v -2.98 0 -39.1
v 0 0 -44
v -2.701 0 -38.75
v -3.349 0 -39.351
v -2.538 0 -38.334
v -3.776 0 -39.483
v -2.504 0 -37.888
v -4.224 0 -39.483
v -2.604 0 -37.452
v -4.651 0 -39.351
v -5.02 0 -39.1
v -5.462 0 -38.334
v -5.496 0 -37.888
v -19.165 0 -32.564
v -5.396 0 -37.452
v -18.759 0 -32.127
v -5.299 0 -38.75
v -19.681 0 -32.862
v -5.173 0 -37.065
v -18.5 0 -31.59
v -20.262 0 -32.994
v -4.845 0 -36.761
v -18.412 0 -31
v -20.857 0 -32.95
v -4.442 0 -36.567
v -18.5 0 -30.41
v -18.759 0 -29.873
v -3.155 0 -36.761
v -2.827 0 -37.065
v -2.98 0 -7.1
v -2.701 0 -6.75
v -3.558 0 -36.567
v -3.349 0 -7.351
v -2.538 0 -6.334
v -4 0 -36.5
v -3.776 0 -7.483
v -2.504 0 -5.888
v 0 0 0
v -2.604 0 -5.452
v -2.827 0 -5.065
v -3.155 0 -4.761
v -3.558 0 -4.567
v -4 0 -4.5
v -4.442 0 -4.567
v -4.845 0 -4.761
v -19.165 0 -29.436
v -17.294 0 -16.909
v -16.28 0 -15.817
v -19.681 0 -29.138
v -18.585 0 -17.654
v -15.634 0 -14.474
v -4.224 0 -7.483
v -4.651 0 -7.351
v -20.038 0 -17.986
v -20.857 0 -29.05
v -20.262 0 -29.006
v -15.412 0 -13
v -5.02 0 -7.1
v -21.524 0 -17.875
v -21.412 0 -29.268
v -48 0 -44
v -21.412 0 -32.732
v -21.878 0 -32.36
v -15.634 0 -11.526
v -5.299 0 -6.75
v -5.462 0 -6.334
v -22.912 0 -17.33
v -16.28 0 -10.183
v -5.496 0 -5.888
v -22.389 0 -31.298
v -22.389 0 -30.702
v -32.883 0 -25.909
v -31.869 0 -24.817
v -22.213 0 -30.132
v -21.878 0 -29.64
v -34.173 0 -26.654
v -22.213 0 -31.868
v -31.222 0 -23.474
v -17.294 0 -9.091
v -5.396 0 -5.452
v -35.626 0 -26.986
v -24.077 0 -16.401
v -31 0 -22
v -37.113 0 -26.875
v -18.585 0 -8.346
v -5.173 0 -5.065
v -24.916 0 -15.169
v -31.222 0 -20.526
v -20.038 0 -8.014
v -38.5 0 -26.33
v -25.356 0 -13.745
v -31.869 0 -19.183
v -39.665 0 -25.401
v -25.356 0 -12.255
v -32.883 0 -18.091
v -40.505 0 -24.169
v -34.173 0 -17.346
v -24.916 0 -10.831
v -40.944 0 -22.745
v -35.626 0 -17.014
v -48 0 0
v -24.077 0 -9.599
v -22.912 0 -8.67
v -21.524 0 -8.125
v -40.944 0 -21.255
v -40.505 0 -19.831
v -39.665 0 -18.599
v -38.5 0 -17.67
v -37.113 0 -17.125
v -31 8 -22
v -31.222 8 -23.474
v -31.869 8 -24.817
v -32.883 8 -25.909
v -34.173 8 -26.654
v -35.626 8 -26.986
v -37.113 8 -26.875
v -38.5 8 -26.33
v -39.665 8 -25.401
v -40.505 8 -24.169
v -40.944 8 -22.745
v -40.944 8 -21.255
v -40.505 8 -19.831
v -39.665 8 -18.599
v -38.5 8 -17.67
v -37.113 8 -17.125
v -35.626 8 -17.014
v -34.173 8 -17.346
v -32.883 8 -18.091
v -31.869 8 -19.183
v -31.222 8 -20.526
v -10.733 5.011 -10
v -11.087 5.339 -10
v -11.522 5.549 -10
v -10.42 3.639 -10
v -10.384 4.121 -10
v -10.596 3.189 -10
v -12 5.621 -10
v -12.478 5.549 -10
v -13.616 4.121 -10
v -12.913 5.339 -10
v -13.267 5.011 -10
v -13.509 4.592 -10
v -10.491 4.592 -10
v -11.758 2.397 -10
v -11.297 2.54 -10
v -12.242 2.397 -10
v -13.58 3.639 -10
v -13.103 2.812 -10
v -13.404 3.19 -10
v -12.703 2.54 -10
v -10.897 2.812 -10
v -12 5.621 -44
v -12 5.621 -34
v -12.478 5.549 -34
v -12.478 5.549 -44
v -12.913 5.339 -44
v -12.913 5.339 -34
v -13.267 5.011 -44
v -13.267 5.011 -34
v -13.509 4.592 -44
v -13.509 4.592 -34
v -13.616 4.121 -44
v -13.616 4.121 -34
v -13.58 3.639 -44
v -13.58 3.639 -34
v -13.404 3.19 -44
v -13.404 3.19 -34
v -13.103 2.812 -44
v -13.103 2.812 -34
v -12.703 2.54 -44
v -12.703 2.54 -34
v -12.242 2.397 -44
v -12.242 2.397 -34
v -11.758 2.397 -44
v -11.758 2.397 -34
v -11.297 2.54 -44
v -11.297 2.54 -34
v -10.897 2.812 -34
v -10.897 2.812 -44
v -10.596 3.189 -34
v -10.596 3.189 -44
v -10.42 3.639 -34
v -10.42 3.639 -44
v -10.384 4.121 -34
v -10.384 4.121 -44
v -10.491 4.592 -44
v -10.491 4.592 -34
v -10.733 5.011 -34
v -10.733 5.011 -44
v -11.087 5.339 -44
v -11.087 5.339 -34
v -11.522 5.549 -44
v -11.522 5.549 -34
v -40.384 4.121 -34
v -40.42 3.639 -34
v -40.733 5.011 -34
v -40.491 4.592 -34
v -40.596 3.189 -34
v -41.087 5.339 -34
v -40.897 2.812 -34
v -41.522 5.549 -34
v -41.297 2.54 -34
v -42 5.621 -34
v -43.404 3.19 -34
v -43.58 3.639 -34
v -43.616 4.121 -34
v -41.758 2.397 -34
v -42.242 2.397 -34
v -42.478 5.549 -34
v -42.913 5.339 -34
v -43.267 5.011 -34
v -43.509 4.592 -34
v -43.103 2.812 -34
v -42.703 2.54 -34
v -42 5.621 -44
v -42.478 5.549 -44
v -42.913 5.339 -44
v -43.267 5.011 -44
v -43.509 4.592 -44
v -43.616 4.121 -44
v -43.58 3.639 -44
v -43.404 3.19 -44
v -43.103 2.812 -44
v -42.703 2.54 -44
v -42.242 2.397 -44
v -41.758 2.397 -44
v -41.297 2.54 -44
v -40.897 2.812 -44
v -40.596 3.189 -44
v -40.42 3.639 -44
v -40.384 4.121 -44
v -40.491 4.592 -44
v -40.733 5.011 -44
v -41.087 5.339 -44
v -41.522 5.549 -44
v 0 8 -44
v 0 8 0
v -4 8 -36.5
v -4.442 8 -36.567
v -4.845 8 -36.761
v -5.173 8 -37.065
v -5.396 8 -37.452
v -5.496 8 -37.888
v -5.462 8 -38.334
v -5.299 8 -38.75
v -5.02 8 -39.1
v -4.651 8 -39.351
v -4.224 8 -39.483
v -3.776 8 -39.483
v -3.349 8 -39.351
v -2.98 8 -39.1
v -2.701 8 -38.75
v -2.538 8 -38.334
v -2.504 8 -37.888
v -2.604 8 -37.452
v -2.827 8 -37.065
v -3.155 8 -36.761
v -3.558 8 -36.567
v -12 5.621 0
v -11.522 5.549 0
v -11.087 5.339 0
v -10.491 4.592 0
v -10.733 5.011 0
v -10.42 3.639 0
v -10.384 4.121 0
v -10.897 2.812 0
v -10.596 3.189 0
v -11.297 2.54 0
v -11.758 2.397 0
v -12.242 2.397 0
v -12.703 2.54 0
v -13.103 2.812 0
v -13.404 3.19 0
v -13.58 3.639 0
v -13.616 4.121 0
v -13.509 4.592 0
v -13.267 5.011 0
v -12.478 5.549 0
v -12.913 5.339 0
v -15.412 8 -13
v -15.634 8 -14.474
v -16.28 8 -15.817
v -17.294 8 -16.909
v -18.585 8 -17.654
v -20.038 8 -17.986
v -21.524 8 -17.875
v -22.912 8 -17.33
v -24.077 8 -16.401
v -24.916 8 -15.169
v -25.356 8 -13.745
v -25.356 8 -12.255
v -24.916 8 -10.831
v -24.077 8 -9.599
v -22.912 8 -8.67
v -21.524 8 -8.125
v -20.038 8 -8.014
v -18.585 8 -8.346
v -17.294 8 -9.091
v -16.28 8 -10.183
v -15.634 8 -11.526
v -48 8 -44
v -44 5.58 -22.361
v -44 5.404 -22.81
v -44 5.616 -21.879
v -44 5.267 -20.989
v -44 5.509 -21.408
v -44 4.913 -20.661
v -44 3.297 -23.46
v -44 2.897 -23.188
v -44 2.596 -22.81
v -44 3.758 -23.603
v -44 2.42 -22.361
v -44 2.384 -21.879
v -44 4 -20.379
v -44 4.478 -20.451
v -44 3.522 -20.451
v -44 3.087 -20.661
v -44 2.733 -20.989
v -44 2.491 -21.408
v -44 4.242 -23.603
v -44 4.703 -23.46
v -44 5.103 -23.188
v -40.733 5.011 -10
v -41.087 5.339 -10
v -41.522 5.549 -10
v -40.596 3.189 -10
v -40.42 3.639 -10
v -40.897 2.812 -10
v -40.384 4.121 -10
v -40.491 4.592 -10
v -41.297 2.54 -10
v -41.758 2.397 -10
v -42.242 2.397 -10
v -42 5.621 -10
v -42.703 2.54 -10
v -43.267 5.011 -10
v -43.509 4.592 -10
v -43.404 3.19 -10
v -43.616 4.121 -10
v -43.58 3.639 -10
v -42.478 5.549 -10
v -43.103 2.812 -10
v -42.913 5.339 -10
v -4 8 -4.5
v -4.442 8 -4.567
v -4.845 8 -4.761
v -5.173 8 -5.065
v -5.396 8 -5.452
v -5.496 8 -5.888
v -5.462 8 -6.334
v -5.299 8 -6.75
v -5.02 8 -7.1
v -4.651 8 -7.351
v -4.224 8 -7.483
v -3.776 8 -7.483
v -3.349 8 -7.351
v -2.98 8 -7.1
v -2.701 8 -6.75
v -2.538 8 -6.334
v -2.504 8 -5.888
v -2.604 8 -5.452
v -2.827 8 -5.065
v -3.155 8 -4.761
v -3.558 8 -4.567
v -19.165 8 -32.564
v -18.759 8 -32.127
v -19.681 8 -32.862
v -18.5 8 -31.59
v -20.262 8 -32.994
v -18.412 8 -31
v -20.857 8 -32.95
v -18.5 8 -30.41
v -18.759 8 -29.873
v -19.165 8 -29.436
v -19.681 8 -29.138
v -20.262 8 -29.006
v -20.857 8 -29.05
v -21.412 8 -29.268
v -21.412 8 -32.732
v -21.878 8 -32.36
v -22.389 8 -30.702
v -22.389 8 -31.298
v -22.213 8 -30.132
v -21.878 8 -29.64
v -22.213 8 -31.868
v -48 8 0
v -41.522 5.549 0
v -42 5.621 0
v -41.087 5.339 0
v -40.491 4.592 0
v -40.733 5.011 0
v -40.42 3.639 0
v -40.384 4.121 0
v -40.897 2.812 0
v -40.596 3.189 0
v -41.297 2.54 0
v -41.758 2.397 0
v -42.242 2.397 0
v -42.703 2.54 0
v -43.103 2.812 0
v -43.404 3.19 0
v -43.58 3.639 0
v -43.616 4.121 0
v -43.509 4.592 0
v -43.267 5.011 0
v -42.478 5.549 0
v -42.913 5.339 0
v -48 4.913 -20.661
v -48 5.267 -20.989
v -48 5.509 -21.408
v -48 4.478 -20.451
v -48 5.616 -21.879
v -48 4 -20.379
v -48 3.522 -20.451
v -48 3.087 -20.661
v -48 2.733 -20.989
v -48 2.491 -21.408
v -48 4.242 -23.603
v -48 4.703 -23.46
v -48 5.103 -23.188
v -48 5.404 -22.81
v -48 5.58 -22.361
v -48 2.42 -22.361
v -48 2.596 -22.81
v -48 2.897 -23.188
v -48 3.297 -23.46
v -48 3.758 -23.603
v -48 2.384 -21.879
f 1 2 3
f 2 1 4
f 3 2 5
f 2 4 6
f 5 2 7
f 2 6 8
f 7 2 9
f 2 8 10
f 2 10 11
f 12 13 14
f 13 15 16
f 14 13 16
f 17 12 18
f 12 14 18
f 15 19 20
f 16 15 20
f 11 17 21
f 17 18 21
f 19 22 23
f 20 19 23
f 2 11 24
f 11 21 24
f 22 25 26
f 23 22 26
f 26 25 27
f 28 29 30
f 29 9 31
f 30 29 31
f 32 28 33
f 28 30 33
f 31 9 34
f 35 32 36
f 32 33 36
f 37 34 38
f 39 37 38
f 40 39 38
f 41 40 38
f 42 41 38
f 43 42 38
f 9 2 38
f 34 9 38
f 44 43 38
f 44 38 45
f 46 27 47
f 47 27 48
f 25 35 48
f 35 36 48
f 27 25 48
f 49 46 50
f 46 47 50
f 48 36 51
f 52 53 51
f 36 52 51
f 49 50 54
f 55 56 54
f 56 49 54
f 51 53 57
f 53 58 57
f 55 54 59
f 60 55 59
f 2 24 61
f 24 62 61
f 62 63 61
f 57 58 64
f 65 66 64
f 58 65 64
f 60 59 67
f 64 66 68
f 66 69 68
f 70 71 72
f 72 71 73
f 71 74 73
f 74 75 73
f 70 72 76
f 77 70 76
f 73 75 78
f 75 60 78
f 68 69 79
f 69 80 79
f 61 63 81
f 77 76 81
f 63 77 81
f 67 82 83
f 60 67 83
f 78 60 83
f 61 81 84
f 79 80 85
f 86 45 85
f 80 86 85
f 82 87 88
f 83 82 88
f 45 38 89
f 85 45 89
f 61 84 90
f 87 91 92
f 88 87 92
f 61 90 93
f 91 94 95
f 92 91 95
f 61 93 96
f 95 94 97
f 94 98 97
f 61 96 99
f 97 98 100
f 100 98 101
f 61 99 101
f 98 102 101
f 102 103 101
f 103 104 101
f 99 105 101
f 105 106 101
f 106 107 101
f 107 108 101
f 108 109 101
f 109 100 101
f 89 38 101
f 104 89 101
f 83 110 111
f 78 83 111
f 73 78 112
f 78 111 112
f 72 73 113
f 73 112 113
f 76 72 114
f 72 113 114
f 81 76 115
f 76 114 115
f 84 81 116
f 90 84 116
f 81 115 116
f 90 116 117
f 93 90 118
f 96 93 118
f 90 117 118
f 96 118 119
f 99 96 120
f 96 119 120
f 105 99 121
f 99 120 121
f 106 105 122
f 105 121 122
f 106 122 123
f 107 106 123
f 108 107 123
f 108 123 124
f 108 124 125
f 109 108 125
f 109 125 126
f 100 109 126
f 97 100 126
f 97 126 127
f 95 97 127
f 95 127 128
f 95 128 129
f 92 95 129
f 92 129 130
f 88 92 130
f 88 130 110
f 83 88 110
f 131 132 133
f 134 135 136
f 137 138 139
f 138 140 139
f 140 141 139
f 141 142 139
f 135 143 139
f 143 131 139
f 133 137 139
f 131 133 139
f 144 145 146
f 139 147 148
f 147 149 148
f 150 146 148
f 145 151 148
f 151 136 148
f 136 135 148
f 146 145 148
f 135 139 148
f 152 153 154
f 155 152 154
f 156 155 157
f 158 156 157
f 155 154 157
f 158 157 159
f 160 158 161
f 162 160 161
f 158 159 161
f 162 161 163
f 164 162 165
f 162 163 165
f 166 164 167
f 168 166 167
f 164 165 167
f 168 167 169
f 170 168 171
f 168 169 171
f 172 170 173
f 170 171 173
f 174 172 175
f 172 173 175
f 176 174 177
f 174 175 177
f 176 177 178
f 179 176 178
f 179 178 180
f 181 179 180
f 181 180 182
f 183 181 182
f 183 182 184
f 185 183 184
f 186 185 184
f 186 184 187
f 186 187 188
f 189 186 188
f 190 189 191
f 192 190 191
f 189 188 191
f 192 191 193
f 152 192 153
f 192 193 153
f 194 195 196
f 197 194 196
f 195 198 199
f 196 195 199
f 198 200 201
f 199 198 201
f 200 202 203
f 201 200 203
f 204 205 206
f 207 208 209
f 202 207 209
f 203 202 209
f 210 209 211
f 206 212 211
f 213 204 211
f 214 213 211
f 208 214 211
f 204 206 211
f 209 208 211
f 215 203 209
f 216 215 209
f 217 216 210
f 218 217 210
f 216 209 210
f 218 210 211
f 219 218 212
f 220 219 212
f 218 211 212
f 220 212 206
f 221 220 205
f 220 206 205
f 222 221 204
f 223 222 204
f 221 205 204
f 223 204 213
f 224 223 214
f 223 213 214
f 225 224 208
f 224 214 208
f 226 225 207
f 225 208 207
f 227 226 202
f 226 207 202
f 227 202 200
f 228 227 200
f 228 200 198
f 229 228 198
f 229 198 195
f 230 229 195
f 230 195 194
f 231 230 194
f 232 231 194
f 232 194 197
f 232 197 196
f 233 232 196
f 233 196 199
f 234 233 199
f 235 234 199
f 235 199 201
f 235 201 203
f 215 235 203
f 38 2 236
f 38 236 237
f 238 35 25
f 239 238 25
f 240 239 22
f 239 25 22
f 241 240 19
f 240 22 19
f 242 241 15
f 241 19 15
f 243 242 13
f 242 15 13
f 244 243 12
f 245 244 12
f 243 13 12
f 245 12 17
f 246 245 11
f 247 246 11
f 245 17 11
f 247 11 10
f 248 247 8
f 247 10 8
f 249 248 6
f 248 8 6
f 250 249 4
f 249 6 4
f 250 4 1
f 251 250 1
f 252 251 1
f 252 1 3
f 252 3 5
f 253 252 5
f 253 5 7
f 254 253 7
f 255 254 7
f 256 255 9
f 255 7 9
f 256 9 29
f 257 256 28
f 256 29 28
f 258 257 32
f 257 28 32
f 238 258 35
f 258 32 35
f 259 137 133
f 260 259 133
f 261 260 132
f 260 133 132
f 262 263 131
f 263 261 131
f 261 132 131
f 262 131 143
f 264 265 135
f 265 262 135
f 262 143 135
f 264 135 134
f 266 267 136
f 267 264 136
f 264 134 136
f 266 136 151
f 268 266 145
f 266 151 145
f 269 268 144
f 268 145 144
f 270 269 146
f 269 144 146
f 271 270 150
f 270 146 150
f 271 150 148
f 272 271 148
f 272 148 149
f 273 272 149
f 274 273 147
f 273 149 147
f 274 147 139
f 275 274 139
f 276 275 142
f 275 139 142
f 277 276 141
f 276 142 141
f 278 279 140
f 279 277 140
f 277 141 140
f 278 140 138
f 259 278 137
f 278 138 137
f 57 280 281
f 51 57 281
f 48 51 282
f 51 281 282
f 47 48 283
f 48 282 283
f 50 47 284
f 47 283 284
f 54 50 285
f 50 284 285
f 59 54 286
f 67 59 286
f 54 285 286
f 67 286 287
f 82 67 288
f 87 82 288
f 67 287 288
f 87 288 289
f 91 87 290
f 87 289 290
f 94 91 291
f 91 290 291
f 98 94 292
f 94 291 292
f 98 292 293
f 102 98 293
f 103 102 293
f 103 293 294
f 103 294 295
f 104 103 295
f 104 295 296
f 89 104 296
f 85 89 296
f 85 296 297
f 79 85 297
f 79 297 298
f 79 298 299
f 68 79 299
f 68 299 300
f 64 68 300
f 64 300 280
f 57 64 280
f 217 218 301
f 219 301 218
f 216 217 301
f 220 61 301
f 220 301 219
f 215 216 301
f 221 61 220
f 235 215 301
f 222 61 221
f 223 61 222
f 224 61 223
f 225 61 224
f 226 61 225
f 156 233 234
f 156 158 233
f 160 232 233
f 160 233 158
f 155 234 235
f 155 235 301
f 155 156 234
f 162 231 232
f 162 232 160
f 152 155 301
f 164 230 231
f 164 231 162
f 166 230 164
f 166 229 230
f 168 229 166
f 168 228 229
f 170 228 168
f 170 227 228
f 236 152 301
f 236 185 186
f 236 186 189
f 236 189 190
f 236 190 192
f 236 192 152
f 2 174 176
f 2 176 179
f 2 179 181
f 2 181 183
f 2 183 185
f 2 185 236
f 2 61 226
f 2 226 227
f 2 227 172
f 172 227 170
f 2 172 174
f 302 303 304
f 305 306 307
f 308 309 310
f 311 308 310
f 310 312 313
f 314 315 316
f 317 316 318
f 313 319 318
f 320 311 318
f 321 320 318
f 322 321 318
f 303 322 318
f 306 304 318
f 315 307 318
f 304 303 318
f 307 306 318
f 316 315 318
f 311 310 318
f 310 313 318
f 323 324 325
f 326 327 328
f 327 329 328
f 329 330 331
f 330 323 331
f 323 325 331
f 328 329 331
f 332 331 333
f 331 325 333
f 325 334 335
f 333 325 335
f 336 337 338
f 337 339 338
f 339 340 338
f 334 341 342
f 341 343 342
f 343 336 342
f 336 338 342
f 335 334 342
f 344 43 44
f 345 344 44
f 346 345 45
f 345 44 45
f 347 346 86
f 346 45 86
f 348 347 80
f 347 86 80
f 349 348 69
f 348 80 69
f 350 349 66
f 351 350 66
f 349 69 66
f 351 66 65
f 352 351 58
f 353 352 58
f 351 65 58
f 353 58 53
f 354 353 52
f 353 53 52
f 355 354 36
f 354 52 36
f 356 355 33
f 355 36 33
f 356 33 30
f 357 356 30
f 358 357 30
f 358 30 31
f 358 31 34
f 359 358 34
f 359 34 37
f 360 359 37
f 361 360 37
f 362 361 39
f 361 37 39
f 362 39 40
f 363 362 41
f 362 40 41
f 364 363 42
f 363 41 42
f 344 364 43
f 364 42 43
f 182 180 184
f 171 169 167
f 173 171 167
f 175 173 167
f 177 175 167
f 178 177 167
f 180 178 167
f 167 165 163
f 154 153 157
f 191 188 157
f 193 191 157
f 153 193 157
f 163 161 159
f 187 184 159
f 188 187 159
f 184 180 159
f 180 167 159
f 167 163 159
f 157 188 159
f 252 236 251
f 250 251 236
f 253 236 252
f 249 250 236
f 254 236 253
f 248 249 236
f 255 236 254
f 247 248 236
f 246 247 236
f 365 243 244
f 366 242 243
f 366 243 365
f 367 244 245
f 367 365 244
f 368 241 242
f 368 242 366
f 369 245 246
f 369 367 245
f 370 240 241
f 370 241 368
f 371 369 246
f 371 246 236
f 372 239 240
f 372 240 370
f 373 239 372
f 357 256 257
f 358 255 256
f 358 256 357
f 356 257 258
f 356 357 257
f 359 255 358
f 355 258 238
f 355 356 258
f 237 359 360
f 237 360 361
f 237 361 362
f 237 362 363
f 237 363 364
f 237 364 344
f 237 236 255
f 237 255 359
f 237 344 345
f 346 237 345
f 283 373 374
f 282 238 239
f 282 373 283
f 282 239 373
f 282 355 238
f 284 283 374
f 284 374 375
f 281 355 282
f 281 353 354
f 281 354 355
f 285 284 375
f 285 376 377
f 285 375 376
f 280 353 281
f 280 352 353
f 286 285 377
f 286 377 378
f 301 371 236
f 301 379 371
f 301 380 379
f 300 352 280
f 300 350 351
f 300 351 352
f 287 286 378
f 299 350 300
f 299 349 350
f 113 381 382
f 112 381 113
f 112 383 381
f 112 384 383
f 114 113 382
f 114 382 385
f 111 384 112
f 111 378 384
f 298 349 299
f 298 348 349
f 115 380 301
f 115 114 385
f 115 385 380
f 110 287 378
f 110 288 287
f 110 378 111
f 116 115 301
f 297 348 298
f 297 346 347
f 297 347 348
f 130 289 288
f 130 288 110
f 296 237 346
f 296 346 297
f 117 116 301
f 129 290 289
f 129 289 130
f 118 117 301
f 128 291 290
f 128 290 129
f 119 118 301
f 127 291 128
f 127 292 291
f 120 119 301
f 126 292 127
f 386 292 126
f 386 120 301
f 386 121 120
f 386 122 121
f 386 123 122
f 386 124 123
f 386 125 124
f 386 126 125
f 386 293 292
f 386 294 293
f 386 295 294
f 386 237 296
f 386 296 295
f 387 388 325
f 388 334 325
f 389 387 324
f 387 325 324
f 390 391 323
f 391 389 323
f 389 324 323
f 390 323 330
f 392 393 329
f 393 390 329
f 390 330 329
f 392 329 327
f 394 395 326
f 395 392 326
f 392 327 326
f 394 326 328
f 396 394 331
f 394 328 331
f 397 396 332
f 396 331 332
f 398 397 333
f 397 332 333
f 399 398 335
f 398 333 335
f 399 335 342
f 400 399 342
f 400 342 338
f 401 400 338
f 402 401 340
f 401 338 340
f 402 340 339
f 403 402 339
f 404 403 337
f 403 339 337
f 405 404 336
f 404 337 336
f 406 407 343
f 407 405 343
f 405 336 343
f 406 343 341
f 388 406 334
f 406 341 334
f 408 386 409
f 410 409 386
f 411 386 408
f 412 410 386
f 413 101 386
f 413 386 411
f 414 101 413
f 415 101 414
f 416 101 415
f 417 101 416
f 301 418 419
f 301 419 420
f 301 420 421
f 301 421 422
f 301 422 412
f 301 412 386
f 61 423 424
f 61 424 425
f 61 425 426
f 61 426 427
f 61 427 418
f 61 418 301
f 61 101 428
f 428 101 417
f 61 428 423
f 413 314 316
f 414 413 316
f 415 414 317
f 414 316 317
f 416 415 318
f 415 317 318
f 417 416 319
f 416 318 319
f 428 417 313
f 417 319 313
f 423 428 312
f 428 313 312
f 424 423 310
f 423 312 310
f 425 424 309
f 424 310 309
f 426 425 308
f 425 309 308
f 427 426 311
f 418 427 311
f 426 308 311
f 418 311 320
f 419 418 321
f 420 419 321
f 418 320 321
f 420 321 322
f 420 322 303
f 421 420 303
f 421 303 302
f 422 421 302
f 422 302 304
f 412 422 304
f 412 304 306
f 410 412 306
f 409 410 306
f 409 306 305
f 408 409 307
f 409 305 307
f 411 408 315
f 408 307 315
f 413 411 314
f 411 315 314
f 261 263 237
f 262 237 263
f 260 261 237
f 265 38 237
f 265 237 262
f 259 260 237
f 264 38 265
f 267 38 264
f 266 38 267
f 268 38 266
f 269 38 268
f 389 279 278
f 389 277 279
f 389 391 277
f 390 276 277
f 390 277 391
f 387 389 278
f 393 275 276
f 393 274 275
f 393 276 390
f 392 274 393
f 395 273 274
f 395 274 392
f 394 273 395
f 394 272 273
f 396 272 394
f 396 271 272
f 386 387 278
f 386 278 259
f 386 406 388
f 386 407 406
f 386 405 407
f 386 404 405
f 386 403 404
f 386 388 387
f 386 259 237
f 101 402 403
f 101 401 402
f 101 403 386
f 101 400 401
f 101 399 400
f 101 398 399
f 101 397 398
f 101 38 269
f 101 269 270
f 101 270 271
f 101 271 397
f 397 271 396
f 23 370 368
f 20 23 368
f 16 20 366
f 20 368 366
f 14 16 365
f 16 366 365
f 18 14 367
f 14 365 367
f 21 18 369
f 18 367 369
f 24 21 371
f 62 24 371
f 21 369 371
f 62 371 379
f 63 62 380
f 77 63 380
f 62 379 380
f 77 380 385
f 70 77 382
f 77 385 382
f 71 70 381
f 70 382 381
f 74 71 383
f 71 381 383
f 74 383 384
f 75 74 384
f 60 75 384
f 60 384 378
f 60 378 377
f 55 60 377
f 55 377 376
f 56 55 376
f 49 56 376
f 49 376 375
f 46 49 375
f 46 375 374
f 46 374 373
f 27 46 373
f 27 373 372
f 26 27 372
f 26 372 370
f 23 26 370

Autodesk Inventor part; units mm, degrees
ref_plane "YZ Plane" through (0, 0, 0) normal (1, 0, 0) x (0, 1, 0)
ref_plane "XZ Plane" through (0, 0, 0) normal (0, 1, 0) x (-1, 0, 0)
sketch "Skizze1" plane through (0, 0, 0) normal (0, 1, 0) x (-1, 0, 0)
  line L0 (0, 0) -> (48, 0)
  line L1 (48, 0) -> (48, -44)
  line L2 (48, -44) -> (0, -44)
  line L3 (0, -44) -> (0, 0)
  dimension "d0" = 44
  dimension "d1" = 48
extrude "Extrusion1" add sketch "Skizze1" along normal blind 8
sketch "Skizze2" plane through (0, 8, 0) normal (0, 1, 0) x (1, 0, 0)
  circle A0 centre (-36, 22) radius 5
  circle A1 centre (-20.4115, 13) radius 5
  circle A2 centre (-20.4115, 31) radius 2
  line L0 (0, 0) -> (0, 44) projected
  line L1 (0, 22) -> (-47.9314, 22) construction
  line L2 (-48, 44) -> (-48, 0) projected
  dimension "d4" = 9
  dimension "d5" = 12
  dimension "d6" = 10
  dimension "d7" = 18
  dimension "d8" = 10
  dimension "d9" = 4
extrude "Extrusion2" cut sketch "Skizze2" against normal up to surface (8 mm away)
sketch "Skizze3" plane through (-48, 0, -44) normal (-1, 0, 0) x (0, 0, 1)
  line L0 (44, 0) -> (44, 8) projected
  line L1 (0, 0) -> (44, 0) projected
  point P0 (22, 4)
  point P1 (44, 4)
  point P2 (22, 0)
hole "Bohrung1" at (-48, 4, -22) direction (1, 0, 0) diameter 3.242 depth 4 thread size "M4x0.7" class "6H" standard "ISO Metric profile"
sketch "Skizze4" plane through (0, 8, 0) normal (0, 1, 0) x (1, 0, 0)
  line L0 (0, 0) -> (0, 44) projected
  line L1 (-48, 0) -> (0, 0) projected
  point P0 (-4, 6)
  point P1 (-4, 38)
  dimension "d26" = 4
  dimension "d27" = 6
  dimension "d28" = 32
hole "Bohrung2" at (-4, 8, -6) at (-4, 8, -38) direction (0, -1, 0) diameter 3 depth 8
sketch "Skizze5" plane through (0, 0, -44) normal (0, 0, -1) x (-1, 0, 0)
  line L0 (48, 0) -> (48, 8) projected
  line L1 (0, 0) -> (0, 8) projected
  point P0 (12, 4)
  point P1 (42, 4)
  point P2 (48, 4)
  dimension "d36" = 30
  dimension "d37" = 12
hole "Bohrung3" at (-12, 4, -44) at (-42, 4, -44) direction (0, 0, 1) diameter 3.242 depth 10 thread size "M4x0.7" class "6H" standard "ISO Metric profile"
ref_plane "Arbeitsebene1" through (0, 0, -22) normal (0, 0, 1) x (1, 0, 0)
mirror "Spiegeln1" about plane through (0, 0, -22) normal (0, 0, 1) of "Bohrung3"
properties part number "1015"
